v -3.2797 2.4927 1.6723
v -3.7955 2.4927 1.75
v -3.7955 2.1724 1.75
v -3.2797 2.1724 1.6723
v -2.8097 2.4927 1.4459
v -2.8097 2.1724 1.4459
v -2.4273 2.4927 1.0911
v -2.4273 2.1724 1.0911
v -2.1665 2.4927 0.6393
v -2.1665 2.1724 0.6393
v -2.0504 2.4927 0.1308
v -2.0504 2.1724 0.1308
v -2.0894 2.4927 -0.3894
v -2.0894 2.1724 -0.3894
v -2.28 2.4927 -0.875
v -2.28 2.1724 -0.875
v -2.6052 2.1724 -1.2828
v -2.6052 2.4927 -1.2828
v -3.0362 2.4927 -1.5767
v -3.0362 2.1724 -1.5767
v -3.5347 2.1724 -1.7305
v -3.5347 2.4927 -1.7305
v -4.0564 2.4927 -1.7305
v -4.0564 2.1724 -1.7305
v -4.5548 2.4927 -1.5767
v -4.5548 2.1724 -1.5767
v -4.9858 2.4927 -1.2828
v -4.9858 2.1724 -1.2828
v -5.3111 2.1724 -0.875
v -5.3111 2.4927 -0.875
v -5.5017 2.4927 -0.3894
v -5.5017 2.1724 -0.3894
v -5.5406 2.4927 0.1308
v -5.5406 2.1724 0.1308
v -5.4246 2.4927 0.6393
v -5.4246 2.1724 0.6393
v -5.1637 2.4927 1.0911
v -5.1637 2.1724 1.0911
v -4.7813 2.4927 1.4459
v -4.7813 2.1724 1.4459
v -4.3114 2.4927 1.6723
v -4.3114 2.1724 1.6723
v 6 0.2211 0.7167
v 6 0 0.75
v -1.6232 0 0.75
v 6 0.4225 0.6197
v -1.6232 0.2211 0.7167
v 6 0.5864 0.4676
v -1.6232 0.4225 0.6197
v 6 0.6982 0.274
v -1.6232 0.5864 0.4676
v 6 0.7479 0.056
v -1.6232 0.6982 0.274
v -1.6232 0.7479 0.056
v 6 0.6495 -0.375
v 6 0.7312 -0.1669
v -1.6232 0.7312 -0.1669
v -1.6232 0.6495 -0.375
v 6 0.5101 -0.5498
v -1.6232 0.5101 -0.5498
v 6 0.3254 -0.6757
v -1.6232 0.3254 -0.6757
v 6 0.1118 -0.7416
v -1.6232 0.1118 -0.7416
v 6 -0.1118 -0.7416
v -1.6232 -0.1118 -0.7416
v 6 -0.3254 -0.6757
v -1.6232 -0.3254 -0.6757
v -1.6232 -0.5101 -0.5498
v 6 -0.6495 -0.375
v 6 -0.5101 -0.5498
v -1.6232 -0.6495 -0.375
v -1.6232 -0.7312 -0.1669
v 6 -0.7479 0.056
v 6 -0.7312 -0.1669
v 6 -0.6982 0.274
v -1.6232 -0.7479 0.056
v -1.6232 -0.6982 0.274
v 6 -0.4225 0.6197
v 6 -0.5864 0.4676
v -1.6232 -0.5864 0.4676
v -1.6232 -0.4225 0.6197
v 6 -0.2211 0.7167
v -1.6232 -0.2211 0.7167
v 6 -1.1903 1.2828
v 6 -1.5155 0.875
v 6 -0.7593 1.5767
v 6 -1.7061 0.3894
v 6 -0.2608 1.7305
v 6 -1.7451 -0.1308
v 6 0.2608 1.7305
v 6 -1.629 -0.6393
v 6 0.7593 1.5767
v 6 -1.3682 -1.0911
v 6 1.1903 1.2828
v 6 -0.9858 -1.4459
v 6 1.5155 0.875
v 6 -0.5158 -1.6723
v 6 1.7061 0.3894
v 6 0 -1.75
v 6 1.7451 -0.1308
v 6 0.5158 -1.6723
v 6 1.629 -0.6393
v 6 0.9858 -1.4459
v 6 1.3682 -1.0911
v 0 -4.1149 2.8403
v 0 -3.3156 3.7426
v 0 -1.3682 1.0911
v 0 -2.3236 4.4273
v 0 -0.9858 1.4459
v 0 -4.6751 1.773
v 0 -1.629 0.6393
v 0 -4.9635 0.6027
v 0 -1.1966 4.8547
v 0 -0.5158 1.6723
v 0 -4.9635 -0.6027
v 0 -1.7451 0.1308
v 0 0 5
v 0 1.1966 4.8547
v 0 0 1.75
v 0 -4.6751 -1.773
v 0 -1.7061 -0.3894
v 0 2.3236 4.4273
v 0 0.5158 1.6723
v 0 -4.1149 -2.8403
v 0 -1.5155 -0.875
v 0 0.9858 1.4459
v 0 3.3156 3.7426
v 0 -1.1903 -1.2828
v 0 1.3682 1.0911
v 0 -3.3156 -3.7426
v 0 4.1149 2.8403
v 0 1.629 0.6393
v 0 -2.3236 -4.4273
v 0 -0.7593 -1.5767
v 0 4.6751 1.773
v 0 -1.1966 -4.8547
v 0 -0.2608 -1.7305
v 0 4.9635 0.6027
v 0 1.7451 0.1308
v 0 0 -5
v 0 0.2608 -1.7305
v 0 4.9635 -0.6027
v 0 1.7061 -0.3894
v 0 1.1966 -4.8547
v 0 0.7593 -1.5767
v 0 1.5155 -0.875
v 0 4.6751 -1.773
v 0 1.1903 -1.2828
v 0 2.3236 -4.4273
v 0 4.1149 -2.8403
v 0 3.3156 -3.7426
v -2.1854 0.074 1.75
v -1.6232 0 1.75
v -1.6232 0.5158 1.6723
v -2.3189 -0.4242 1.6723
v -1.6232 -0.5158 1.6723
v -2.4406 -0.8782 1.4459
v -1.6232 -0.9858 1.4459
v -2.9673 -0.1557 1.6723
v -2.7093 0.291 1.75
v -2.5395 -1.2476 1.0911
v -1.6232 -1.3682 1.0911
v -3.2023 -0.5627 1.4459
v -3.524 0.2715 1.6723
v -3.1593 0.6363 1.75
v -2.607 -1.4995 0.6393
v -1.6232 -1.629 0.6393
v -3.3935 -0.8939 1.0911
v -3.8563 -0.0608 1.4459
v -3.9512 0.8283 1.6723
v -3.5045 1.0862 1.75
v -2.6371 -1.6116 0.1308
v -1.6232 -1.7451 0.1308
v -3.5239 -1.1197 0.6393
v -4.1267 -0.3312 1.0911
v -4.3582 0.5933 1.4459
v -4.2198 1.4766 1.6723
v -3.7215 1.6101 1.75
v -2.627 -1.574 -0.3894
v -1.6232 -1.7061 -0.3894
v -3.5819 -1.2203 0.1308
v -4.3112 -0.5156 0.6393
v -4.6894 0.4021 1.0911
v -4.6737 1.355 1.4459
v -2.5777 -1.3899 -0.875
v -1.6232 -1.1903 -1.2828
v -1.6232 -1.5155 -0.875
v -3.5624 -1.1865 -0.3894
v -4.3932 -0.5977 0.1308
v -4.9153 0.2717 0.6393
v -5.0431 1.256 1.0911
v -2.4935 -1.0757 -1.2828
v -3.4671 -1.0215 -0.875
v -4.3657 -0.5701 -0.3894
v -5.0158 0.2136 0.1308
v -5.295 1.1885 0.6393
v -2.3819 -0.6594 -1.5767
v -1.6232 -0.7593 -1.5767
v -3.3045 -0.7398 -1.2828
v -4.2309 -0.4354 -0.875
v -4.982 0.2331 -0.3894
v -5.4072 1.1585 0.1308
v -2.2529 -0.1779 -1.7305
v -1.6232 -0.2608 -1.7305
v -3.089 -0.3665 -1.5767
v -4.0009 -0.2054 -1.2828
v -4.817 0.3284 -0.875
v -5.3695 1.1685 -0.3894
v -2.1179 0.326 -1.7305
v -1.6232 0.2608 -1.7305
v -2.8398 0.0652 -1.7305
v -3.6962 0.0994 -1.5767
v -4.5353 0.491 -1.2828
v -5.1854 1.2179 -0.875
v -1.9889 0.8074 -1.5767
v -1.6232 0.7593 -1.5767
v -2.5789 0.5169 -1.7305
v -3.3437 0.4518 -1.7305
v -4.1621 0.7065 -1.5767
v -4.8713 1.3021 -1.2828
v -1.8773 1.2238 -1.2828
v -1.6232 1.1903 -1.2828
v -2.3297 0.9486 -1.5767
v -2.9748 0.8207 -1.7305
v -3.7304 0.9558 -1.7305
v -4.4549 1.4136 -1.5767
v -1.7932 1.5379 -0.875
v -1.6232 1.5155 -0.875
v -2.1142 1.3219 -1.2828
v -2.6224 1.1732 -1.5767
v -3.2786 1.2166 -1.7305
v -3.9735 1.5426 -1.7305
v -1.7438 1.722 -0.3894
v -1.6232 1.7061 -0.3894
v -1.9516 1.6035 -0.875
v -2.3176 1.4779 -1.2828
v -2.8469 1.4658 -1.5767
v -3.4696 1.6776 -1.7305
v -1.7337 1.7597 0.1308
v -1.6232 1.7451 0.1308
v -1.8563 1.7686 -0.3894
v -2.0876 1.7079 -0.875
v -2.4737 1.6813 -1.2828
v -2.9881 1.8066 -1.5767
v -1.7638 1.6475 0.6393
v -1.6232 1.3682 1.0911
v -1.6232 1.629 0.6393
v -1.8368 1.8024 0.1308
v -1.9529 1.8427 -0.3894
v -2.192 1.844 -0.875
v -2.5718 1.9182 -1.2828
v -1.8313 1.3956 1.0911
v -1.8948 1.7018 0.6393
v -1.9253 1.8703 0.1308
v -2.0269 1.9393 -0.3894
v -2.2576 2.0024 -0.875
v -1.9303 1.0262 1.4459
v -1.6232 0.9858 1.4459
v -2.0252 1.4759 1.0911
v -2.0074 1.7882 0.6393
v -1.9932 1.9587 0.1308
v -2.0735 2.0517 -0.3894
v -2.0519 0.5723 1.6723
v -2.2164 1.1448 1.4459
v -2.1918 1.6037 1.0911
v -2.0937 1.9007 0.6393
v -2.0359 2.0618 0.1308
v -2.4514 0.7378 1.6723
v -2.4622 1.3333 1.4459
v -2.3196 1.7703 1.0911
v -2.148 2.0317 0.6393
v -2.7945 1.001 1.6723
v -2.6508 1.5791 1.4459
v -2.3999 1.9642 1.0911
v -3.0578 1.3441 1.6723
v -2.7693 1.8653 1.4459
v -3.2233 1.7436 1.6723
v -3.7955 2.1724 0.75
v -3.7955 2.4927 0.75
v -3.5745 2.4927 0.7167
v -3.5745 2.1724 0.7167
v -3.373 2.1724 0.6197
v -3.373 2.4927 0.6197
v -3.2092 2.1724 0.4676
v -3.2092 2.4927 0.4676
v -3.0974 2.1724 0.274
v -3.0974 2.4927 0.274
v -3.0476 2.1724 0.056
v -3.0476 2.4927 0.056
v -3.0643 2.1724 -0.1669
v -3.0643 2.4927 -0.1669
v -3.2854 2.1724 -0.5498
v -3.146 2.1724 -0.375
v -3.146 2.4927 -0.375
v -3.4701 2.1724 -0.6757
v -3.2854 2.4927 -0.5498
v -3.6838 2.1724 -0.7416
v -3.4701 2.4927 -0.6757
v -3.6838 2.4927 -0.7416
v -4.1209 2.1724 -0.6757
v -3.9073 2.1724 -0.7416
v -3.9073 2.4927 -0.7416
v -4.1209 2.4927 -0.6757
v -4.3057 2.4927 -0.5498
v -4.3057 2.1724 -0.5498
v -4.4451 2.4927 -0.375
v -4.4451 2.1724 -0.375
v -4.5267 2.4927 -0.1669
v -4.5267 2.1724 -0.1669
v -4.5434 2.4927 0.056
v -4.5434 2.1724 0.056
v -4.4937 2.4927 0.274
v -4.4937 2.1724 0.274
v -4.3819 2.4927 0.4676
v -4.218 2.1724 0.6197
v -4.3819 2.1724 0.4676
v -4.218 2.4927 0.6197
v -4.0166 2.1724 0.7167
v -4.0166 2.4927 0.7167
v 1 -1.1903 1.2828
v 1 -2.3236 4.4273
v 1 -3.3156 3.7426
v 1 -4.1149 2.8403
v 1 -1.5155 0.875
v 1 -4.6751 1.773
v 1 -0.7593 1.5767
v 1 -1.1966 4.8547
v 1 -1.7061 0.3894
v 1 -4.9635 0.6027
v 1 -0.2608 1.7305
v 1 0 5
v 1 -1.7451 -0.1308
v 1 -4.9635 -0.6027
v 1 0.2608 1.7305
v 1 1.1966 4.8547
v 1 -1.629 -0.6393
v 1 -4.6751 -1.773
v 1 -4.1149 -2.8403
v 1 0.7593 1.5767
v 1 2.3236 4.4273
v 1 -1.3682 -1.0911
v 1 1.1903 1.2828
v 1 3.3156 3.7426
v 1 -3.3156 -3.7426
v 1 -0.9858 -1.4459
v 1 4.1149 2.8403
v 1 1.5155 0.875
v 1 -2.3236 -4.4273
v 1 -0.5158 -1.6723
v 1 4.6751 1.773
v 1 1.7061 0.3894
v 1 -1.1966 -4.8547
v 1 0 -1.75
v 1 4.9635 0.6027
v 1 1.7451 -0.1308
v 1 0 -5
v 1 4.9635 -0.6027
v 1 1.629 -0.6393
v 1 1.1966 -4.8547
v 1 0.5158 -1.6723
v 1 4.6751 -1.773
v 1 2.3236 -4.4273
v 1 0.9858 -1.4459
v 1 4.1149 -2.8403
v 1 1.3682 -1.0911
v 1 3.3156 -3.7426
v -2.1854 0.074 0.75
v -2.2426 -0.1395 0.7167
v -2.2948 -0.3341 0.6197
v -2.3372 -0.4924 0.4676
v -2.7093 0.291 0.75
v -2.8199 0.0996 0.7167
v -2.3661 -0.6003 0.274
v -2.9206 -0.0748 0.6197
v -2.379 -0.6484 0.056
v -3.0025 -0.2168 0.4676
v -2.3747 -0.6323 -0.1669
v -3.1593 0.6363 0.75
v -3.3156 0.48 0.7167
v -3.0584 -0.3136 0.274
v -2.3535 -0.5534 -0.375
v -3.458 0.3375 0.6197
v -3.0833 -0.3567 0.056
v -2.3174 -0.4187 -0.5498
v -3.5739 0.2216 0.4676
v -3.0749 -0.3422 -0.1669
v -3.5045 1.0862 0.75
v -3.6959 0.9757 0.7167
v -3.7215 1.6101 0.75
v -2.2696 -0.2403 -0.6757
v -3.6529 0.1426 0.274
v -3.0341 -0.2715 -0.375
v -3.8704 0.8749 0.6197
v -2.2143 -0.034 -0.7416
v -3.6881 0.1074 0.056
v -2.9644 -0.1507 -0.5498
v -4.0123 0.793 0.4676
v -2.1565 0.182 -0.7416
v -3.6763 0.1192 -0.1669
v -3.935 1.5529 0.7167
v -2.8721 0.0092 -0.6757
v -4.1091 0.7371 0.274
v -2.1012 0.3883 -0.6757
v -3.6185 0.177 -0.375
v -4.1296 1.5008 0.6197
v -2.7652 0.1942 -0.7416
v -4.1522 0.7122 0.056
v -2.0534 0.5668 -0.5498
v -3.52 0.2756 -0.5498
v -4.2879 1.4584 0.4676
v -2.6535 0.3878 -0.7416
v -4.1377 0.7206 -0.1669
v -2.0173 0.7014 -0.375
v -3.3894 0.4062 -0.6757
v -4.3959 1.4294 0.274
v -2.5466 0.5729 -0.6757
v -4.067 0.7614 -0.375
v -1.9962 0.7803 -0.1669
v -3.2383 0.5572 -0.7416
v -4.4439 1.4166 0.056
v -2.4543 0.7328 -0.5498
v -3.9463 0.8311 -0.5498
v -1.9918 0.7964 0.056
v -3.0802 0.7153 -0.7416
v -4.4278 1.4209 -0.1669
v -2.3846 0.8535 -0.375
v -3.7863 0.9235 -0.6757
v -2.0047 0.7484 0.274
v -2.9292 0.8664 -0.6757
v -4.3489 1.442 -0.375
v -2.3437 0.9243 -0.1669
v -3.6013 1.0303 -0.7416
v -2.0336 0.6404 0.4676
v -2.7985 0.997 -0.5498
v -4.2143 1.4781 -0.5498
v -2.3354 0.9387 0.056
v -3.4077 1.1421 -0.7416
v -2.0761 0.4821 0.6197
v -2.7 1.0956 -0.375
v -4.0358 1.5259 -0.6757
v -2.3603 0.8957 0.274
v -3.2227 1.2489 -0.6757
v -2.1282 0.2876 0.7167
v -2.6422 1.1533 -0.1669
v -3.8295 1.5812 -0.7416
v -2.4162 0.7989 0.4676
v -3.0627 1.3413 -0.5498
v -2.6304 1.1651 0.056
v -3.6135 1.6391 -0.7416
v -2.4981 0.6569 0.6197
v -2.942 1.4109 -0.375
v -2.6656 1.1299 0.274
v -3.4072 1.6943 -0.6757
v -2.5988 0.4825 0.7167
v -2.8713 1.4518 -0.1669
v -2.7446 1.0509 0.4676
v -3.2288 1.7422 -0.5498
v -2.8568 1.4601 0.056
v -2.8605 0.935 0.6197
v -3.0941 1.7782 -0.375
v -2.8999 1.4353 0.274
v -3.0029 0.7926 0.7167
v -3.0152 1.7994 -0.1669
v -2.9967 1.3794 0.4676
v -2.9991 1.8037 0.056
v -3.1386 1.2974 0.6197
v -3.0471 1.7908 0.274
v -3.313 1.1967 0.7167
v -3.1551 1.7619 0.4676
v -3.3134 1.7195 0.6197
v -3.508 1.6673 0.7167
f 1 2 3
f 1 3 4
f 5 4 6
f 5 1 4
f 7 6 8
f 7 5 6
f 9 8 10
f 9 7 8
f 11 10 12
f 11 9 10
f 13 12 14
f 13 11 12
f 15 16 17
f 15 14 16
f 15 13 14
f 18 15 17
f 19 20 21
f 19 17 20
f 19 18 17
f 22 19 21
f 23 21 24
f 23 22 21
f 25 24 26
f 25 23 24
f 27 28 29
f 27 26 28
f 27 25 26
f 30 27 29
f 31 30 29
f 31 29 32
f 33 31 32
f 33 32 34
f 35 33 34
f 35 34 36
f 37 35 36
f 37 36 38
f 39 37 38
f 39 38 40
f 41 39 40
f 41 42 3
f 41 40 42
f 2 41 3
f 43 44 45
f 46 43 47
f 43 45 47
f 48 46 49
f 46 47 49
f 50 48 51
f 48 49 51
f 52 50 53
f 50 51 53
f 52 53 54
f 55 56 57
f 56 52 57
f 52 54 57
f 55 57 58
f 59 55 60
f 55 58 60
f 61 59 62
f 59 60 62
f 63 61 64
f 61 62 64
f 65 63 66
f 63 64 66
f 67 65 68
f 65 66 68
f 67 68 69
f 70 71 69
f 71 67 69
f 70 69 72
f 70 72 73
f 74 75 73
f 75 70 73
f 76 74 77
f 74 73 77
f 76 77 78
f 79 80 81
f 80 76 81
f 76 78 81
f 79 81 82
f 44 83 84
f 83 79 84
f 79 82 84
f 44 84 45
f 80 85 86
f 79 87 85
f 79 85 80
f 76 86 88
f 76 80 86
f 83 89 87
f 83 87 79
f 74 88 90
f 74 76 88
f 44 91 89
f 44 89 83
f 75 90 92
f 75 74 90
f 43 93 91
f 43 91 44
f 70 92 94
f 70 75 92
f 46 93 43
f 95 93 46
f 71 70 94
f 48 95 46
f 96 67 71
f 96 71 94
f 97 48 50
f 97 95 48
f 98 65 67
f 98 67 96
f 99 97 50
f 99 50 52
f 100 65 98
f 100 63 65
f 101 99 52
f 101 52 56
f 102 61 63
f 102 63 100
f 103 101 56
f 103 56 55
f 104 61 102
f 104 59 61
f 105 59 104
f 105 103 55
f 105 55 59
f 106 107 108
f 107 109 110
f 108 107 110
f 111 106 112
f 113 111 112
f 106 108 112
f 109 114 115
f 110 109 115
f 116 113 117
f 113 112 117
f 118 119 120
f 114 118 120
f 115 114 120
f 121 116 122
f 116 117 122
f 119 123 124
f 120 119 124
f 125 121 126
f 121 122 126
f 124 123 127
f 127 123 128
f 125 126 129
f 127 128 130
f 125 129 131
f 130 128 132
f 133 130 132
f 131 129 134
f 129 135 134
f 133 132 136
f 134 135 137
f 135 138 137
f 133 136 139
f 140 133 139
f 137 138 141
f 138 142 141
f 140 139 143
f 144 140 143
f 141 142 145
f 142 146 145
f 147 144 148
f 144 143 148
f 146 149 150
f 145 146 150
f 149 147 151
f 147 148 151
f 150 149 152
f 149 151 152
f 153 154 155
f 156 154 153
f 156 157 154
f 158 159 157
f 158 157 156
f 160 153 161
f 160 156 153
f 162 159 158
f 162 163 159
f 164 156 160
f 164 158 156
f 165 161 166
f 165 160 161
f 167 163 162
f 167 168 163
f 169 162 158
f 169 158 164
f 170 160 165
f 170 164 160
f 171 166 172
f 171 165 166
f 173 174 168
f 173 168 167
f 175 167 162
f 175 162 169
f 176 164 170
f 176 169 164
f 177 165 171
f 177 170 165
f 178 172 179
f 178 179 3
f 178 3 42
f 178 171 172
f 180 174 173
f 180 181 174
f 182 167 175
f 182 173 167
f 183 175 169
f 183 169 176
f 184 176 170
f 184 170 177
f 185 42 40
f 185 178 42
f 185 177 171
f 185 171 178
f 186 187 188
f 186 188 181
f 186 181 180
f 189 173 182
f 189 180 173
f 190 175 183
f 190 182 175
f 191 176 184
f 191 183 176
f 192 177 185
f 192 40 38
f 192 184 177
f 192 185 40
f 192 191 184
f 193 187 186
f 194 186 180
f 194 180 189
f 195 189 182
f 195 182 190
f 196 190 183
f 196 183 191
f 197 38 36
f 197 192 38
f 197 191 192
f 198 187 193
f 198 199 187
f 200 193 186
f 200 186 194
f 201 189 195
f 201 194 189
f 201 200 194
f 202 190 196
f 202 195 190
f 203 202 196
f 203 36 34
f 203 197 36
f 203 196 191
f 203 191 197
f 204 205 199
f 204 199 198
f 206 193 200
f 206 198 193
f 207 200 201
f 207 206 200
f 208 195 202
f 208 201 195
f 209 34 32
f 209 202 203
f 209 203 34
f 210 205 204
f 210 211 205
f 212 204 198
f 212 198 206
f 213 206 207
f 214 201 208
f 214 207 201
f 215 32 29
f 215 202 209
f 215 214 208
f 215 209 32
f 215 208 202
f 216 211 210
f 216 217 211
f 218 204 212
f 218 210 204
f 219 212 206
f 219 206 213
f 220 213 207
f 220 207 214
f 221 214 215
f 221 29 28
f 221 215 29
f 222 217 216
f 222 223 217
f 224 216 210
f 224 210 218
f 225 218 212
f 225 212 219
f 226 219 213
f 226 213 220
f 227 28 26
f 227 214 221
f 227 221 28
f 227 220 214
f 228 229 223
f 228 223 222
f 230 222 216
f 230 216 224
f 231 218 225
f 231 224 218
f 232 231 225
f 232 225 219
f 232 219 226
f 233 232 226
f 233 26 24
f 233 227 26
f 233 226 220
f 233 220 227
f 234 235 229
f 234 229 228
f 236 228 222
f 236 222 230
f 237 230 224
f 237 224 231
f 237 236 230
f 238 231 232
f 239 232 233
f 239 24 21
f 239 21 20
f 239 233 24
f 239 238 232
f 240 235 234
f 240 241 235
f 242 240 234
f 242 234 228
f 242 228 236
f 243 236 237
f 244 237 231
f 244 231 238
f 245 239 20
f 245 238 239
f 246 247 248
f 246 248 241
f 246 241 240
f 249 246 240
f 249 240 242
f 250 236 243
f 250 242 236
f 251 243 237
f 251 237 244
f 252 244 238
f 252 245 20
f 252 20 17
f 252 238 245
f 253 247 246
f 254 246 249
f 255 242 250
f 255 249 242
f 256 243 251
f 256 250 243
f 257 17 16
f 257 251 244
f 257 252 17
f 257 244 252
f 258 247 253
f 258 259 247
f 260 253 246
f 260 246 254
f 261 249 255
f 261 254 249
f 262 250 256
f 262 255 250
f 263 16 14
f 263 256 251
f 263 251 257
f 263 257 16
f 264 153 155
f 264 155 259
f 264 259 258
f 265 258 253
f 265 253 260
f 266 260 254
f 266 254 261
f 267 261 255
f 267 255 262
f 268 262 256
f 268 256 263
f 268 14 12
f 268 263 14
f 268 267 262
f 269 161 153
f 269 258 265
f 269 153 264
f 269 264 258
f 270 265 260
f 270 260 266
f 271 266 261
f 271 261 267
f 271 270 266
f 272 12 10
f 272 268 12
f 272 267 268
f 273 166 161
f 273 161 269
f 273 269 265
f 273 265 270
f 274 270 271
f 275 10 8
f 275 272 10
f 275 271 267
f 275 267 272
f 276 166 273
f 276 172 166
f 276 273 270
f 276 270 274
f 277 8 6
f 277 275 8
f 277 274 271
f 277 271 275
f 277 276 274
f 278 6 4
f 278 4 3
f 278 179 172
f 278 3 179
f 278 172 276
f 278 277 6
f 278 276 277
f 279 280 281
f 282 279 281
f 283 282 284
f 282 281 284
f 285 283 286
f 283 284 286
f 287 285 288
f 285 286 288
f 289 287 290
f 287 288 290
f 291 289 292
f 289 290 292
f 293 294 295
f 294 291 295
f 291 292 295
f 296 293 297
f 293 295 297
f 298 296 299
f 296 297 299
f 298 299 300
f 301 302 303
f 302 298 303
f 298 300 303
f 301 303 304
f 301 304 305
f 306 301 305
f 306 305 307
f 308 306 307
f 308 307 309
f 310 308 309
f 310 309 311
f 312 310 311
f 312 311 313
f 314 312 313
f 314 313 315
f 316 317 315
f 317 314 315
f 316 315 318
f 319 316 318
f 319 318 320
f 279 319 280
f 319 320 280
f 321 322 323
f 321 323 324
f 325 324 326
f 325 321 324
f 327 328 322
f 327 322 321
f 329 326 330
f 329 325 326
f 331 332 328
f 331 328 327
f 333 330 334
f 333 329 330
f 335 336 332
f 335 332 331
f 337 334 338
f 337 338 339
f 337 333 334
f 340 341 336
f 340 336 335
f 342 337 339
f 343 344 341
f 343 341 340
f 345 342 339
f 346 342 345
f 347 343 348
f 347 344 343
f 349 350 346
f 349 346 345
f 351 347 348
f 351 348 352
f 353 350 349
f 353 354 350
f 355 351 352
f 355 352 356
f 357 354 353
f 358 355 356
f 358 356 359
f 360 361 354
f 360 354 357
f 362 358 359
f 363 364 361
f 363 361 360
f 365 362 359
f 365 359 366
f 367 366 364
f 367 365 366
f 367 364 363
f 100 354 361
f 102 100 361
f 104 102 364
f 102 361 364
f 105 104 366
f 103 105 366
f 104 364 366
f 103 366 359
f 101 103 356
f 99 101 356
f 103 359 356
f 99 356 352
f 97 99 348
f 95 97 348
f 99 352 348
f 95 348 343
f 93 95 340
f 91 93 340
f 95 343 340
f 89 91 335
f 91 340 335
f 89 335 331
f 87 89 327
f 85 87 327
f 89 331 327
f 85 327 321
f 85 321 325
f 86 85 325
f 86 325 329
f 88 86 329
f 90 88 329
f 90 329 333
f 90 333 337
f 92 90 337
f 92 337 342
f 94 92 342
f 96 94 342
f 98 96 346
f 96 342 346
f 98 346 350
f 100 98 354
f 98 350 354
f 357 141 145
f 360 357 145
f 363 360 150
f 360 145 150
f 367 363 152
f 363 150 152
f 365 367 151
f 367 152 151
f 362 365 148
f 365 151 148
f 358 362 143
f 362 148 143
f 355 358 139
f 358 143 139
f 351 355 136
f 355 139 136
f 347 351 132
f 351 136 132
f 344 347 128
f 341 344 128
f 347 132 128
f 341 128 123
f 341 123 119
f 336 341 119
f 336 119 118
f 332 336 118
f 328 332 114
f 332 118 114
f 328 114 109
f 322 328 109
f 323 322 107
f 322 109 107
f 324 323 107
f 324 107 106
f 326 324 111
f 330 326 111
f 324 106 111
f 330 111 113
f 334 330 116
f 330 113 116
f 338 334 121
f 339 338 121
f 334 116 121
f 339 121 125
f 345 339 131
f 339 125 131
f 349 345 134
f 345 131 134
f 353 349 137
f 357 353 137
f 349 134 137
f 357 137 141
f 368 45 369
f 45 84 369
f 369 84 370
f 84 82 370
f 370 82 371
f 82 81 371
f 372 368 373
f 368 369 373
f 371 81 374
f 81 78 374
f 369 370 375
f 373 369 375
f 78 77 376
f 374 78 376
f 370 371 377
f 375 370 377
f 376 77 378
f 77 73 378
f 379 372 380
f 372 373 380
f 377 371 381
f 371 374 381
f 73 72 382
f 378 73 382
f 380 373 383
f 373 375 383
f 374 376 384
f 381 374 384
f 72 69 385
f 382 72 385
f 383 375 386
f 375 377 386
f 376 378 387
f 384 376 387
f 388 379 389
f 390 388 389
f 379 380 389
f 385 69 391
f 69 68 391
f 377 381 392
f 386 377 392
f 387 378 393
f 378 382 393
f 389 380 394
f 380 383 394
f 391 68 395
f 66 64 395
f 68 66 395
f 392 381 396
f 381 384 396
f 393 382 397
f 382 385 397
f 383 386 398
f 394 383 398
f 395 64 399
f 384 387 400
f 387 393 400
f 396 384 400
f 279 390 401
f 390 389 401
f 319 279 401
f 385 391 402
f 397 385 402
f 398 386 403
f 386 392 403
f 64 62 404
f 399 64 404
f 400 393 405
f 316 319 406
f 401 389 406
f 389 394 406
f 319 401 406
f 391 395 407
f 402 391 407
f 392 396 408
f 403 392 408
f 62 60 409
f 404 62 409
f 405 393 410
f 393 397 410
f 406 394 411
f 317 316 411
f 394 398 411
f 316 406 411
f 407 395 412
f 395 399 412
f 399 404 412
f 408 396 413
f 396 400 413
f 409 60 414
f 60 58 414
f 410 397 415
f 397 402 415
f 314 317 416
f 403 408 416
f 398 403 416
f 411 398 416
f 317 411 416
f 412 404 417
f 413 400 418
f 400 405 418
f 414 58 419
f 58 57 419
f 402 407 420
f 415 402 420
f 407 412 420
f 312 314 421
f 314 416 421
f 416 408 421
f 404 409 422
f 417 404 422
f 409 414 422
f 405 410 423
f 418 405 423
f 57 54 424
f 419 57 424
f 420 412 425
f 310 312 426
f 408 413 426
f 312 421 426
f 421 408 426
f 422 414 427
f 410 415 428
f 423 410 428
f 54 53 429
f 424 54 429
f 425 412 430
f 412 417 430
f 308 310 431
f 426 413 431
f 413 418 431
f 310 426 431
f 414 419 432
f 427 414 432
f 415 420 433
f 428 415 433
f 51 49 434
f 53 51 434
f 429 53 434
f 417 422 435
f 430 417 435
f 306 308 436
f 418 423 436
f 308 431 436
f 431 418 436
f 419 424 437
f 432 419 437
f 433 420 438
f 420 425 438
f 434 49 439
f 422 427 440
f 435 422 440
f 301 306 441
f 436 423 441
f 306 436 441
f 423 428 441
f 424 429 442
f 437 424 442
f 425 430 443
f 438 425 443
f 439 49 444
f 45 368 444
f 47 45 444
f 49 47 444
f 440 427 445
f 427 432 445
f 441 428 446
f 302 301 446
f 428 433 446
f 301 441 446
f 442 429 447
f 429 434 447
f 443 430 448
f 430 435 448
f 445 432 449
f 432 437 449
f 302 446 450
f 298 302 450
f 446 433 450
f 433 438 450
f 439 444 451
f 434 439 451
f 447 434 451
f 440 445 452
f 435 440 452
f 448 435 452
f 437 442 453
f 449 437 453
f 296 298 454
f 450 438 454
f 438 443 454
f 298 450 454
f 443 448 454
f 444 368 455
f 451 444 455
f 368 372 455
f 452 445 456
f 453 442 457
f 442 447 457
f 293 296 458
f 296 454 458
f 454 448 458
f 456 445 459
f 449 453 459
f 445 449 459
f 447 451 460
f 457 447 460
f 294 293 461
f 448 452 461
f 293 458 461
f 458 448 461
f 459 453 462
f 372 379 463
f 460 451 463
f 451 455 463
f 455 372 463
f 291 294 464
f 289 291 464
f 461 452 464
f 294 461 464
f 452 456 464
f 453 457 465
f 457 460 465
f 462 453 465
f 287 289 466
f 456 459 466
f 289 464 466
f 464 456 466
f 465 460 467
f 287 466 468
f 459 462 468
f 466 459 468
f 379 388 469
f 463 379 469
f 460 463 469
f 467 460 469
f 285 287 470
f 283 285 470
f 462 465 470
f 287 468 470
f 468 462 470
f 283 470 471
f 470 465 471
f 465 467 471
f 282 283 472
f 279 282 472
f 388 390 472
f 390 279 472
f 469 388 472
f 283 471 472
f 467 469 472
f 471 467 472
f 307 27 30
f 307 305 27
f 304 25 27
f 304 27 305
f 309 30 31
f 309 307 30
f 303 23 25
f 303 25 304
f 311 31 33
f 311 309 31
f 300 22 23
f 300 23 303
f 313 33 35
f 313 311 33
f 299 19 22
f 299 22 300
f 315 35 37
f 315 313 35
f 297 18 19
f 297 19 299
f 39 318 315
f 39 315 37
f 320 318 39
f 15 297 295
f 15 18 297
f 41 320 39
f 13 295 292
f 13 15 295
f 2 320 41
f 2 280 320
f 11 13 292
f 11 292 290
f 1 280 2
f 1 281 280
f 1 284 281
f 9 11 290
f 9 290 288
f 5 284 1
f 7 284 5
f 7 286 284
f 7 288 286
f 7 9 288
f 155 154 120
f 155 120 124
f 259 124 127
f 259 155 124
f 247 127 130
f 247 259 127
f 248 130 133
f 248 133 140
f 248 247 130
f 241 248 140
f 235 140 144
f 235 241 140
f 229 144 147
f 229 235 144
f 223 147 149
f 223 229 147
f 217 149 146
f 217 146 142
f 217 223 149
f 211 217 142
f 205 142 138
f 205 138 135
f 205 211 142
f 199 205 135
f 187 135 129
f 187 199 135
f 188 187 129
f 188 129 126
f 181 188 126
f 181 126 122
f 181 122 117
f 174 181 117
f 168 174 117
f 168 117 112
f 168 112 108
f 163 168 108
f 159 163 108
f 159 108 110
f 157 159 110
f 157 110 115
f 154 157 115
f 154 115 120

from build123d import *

# Parameters (mm, degrees)
SKETCH1_R           = 5
BOSS_EXTRUDE1_DEPTH = 1
SKETCH2_R           = 1.75
SKETCH2_R_2         = 0.75
BOSS_EXTRUDE2_DEPTH = 5
SKETCH4_R           = 0.75
CUT_EXTRUDE1_DEPTH  = 10
SKETCH5_R           = 1.75
SKETCH5_R_2         = 0.75


with BuildPart() as part:
    # Sketch1 → Boss-Extrude1 (new body)
    with BuildSketch(Plane(origin=(0, 0, 0), x_dir=(0, 0, -1), z_dir=(1, 0, 0))):
        Circle(SKETCH1_R)
    extrude(amount=BOSS_EXTRUDE1_DEPTH)

    # Sketch2 → Boss-Extrude2 (add)
    with BuildSketch(Plane(origin=(1, 0, 0), x_dir=(0, 0, -1), z_dir=(1, 0, 0))):
        Circle(SKETCH2_R)
        Circle(SKETCH2_R_2, mode=Mode.SUBTRACT)
    extrude(amount=BOSS_EXTRUDE2_DEPTH)

    # Sketch4 → Cut-Extrude1 (cut)
    with BuildSketch(Plane.ZY):
        Circle(SKETCH4_R)
    extrude(amount=-CUT_EXTRUDE1_DEPTH, mode=Mode.SUBTRACT)

    # Sweep5: sweep along a path in Sketch6
    with BuildLine(Plane.XY) as sweep5_path:
        Line((0, 1.75), (-1.62315873, 1.75))
        ThreePointArc((-1.62315873, 1.75), (-1.921825037, 1.873711635), (-2.045536672, 2.172377942))
        Line((-2.045536672, 2.172377942), (-2.045536672, 2.4927445))
    # Sketch5 → Sweep5 (sweep)
    with BuildSketch(Plane.ZY):
        Circle(SKETCH5_R)
        Circle(SKETCH5_R_2, mode=Mode.SUBTRACT)
    sweep(path=sweep5_path.line)


solid = part.part
